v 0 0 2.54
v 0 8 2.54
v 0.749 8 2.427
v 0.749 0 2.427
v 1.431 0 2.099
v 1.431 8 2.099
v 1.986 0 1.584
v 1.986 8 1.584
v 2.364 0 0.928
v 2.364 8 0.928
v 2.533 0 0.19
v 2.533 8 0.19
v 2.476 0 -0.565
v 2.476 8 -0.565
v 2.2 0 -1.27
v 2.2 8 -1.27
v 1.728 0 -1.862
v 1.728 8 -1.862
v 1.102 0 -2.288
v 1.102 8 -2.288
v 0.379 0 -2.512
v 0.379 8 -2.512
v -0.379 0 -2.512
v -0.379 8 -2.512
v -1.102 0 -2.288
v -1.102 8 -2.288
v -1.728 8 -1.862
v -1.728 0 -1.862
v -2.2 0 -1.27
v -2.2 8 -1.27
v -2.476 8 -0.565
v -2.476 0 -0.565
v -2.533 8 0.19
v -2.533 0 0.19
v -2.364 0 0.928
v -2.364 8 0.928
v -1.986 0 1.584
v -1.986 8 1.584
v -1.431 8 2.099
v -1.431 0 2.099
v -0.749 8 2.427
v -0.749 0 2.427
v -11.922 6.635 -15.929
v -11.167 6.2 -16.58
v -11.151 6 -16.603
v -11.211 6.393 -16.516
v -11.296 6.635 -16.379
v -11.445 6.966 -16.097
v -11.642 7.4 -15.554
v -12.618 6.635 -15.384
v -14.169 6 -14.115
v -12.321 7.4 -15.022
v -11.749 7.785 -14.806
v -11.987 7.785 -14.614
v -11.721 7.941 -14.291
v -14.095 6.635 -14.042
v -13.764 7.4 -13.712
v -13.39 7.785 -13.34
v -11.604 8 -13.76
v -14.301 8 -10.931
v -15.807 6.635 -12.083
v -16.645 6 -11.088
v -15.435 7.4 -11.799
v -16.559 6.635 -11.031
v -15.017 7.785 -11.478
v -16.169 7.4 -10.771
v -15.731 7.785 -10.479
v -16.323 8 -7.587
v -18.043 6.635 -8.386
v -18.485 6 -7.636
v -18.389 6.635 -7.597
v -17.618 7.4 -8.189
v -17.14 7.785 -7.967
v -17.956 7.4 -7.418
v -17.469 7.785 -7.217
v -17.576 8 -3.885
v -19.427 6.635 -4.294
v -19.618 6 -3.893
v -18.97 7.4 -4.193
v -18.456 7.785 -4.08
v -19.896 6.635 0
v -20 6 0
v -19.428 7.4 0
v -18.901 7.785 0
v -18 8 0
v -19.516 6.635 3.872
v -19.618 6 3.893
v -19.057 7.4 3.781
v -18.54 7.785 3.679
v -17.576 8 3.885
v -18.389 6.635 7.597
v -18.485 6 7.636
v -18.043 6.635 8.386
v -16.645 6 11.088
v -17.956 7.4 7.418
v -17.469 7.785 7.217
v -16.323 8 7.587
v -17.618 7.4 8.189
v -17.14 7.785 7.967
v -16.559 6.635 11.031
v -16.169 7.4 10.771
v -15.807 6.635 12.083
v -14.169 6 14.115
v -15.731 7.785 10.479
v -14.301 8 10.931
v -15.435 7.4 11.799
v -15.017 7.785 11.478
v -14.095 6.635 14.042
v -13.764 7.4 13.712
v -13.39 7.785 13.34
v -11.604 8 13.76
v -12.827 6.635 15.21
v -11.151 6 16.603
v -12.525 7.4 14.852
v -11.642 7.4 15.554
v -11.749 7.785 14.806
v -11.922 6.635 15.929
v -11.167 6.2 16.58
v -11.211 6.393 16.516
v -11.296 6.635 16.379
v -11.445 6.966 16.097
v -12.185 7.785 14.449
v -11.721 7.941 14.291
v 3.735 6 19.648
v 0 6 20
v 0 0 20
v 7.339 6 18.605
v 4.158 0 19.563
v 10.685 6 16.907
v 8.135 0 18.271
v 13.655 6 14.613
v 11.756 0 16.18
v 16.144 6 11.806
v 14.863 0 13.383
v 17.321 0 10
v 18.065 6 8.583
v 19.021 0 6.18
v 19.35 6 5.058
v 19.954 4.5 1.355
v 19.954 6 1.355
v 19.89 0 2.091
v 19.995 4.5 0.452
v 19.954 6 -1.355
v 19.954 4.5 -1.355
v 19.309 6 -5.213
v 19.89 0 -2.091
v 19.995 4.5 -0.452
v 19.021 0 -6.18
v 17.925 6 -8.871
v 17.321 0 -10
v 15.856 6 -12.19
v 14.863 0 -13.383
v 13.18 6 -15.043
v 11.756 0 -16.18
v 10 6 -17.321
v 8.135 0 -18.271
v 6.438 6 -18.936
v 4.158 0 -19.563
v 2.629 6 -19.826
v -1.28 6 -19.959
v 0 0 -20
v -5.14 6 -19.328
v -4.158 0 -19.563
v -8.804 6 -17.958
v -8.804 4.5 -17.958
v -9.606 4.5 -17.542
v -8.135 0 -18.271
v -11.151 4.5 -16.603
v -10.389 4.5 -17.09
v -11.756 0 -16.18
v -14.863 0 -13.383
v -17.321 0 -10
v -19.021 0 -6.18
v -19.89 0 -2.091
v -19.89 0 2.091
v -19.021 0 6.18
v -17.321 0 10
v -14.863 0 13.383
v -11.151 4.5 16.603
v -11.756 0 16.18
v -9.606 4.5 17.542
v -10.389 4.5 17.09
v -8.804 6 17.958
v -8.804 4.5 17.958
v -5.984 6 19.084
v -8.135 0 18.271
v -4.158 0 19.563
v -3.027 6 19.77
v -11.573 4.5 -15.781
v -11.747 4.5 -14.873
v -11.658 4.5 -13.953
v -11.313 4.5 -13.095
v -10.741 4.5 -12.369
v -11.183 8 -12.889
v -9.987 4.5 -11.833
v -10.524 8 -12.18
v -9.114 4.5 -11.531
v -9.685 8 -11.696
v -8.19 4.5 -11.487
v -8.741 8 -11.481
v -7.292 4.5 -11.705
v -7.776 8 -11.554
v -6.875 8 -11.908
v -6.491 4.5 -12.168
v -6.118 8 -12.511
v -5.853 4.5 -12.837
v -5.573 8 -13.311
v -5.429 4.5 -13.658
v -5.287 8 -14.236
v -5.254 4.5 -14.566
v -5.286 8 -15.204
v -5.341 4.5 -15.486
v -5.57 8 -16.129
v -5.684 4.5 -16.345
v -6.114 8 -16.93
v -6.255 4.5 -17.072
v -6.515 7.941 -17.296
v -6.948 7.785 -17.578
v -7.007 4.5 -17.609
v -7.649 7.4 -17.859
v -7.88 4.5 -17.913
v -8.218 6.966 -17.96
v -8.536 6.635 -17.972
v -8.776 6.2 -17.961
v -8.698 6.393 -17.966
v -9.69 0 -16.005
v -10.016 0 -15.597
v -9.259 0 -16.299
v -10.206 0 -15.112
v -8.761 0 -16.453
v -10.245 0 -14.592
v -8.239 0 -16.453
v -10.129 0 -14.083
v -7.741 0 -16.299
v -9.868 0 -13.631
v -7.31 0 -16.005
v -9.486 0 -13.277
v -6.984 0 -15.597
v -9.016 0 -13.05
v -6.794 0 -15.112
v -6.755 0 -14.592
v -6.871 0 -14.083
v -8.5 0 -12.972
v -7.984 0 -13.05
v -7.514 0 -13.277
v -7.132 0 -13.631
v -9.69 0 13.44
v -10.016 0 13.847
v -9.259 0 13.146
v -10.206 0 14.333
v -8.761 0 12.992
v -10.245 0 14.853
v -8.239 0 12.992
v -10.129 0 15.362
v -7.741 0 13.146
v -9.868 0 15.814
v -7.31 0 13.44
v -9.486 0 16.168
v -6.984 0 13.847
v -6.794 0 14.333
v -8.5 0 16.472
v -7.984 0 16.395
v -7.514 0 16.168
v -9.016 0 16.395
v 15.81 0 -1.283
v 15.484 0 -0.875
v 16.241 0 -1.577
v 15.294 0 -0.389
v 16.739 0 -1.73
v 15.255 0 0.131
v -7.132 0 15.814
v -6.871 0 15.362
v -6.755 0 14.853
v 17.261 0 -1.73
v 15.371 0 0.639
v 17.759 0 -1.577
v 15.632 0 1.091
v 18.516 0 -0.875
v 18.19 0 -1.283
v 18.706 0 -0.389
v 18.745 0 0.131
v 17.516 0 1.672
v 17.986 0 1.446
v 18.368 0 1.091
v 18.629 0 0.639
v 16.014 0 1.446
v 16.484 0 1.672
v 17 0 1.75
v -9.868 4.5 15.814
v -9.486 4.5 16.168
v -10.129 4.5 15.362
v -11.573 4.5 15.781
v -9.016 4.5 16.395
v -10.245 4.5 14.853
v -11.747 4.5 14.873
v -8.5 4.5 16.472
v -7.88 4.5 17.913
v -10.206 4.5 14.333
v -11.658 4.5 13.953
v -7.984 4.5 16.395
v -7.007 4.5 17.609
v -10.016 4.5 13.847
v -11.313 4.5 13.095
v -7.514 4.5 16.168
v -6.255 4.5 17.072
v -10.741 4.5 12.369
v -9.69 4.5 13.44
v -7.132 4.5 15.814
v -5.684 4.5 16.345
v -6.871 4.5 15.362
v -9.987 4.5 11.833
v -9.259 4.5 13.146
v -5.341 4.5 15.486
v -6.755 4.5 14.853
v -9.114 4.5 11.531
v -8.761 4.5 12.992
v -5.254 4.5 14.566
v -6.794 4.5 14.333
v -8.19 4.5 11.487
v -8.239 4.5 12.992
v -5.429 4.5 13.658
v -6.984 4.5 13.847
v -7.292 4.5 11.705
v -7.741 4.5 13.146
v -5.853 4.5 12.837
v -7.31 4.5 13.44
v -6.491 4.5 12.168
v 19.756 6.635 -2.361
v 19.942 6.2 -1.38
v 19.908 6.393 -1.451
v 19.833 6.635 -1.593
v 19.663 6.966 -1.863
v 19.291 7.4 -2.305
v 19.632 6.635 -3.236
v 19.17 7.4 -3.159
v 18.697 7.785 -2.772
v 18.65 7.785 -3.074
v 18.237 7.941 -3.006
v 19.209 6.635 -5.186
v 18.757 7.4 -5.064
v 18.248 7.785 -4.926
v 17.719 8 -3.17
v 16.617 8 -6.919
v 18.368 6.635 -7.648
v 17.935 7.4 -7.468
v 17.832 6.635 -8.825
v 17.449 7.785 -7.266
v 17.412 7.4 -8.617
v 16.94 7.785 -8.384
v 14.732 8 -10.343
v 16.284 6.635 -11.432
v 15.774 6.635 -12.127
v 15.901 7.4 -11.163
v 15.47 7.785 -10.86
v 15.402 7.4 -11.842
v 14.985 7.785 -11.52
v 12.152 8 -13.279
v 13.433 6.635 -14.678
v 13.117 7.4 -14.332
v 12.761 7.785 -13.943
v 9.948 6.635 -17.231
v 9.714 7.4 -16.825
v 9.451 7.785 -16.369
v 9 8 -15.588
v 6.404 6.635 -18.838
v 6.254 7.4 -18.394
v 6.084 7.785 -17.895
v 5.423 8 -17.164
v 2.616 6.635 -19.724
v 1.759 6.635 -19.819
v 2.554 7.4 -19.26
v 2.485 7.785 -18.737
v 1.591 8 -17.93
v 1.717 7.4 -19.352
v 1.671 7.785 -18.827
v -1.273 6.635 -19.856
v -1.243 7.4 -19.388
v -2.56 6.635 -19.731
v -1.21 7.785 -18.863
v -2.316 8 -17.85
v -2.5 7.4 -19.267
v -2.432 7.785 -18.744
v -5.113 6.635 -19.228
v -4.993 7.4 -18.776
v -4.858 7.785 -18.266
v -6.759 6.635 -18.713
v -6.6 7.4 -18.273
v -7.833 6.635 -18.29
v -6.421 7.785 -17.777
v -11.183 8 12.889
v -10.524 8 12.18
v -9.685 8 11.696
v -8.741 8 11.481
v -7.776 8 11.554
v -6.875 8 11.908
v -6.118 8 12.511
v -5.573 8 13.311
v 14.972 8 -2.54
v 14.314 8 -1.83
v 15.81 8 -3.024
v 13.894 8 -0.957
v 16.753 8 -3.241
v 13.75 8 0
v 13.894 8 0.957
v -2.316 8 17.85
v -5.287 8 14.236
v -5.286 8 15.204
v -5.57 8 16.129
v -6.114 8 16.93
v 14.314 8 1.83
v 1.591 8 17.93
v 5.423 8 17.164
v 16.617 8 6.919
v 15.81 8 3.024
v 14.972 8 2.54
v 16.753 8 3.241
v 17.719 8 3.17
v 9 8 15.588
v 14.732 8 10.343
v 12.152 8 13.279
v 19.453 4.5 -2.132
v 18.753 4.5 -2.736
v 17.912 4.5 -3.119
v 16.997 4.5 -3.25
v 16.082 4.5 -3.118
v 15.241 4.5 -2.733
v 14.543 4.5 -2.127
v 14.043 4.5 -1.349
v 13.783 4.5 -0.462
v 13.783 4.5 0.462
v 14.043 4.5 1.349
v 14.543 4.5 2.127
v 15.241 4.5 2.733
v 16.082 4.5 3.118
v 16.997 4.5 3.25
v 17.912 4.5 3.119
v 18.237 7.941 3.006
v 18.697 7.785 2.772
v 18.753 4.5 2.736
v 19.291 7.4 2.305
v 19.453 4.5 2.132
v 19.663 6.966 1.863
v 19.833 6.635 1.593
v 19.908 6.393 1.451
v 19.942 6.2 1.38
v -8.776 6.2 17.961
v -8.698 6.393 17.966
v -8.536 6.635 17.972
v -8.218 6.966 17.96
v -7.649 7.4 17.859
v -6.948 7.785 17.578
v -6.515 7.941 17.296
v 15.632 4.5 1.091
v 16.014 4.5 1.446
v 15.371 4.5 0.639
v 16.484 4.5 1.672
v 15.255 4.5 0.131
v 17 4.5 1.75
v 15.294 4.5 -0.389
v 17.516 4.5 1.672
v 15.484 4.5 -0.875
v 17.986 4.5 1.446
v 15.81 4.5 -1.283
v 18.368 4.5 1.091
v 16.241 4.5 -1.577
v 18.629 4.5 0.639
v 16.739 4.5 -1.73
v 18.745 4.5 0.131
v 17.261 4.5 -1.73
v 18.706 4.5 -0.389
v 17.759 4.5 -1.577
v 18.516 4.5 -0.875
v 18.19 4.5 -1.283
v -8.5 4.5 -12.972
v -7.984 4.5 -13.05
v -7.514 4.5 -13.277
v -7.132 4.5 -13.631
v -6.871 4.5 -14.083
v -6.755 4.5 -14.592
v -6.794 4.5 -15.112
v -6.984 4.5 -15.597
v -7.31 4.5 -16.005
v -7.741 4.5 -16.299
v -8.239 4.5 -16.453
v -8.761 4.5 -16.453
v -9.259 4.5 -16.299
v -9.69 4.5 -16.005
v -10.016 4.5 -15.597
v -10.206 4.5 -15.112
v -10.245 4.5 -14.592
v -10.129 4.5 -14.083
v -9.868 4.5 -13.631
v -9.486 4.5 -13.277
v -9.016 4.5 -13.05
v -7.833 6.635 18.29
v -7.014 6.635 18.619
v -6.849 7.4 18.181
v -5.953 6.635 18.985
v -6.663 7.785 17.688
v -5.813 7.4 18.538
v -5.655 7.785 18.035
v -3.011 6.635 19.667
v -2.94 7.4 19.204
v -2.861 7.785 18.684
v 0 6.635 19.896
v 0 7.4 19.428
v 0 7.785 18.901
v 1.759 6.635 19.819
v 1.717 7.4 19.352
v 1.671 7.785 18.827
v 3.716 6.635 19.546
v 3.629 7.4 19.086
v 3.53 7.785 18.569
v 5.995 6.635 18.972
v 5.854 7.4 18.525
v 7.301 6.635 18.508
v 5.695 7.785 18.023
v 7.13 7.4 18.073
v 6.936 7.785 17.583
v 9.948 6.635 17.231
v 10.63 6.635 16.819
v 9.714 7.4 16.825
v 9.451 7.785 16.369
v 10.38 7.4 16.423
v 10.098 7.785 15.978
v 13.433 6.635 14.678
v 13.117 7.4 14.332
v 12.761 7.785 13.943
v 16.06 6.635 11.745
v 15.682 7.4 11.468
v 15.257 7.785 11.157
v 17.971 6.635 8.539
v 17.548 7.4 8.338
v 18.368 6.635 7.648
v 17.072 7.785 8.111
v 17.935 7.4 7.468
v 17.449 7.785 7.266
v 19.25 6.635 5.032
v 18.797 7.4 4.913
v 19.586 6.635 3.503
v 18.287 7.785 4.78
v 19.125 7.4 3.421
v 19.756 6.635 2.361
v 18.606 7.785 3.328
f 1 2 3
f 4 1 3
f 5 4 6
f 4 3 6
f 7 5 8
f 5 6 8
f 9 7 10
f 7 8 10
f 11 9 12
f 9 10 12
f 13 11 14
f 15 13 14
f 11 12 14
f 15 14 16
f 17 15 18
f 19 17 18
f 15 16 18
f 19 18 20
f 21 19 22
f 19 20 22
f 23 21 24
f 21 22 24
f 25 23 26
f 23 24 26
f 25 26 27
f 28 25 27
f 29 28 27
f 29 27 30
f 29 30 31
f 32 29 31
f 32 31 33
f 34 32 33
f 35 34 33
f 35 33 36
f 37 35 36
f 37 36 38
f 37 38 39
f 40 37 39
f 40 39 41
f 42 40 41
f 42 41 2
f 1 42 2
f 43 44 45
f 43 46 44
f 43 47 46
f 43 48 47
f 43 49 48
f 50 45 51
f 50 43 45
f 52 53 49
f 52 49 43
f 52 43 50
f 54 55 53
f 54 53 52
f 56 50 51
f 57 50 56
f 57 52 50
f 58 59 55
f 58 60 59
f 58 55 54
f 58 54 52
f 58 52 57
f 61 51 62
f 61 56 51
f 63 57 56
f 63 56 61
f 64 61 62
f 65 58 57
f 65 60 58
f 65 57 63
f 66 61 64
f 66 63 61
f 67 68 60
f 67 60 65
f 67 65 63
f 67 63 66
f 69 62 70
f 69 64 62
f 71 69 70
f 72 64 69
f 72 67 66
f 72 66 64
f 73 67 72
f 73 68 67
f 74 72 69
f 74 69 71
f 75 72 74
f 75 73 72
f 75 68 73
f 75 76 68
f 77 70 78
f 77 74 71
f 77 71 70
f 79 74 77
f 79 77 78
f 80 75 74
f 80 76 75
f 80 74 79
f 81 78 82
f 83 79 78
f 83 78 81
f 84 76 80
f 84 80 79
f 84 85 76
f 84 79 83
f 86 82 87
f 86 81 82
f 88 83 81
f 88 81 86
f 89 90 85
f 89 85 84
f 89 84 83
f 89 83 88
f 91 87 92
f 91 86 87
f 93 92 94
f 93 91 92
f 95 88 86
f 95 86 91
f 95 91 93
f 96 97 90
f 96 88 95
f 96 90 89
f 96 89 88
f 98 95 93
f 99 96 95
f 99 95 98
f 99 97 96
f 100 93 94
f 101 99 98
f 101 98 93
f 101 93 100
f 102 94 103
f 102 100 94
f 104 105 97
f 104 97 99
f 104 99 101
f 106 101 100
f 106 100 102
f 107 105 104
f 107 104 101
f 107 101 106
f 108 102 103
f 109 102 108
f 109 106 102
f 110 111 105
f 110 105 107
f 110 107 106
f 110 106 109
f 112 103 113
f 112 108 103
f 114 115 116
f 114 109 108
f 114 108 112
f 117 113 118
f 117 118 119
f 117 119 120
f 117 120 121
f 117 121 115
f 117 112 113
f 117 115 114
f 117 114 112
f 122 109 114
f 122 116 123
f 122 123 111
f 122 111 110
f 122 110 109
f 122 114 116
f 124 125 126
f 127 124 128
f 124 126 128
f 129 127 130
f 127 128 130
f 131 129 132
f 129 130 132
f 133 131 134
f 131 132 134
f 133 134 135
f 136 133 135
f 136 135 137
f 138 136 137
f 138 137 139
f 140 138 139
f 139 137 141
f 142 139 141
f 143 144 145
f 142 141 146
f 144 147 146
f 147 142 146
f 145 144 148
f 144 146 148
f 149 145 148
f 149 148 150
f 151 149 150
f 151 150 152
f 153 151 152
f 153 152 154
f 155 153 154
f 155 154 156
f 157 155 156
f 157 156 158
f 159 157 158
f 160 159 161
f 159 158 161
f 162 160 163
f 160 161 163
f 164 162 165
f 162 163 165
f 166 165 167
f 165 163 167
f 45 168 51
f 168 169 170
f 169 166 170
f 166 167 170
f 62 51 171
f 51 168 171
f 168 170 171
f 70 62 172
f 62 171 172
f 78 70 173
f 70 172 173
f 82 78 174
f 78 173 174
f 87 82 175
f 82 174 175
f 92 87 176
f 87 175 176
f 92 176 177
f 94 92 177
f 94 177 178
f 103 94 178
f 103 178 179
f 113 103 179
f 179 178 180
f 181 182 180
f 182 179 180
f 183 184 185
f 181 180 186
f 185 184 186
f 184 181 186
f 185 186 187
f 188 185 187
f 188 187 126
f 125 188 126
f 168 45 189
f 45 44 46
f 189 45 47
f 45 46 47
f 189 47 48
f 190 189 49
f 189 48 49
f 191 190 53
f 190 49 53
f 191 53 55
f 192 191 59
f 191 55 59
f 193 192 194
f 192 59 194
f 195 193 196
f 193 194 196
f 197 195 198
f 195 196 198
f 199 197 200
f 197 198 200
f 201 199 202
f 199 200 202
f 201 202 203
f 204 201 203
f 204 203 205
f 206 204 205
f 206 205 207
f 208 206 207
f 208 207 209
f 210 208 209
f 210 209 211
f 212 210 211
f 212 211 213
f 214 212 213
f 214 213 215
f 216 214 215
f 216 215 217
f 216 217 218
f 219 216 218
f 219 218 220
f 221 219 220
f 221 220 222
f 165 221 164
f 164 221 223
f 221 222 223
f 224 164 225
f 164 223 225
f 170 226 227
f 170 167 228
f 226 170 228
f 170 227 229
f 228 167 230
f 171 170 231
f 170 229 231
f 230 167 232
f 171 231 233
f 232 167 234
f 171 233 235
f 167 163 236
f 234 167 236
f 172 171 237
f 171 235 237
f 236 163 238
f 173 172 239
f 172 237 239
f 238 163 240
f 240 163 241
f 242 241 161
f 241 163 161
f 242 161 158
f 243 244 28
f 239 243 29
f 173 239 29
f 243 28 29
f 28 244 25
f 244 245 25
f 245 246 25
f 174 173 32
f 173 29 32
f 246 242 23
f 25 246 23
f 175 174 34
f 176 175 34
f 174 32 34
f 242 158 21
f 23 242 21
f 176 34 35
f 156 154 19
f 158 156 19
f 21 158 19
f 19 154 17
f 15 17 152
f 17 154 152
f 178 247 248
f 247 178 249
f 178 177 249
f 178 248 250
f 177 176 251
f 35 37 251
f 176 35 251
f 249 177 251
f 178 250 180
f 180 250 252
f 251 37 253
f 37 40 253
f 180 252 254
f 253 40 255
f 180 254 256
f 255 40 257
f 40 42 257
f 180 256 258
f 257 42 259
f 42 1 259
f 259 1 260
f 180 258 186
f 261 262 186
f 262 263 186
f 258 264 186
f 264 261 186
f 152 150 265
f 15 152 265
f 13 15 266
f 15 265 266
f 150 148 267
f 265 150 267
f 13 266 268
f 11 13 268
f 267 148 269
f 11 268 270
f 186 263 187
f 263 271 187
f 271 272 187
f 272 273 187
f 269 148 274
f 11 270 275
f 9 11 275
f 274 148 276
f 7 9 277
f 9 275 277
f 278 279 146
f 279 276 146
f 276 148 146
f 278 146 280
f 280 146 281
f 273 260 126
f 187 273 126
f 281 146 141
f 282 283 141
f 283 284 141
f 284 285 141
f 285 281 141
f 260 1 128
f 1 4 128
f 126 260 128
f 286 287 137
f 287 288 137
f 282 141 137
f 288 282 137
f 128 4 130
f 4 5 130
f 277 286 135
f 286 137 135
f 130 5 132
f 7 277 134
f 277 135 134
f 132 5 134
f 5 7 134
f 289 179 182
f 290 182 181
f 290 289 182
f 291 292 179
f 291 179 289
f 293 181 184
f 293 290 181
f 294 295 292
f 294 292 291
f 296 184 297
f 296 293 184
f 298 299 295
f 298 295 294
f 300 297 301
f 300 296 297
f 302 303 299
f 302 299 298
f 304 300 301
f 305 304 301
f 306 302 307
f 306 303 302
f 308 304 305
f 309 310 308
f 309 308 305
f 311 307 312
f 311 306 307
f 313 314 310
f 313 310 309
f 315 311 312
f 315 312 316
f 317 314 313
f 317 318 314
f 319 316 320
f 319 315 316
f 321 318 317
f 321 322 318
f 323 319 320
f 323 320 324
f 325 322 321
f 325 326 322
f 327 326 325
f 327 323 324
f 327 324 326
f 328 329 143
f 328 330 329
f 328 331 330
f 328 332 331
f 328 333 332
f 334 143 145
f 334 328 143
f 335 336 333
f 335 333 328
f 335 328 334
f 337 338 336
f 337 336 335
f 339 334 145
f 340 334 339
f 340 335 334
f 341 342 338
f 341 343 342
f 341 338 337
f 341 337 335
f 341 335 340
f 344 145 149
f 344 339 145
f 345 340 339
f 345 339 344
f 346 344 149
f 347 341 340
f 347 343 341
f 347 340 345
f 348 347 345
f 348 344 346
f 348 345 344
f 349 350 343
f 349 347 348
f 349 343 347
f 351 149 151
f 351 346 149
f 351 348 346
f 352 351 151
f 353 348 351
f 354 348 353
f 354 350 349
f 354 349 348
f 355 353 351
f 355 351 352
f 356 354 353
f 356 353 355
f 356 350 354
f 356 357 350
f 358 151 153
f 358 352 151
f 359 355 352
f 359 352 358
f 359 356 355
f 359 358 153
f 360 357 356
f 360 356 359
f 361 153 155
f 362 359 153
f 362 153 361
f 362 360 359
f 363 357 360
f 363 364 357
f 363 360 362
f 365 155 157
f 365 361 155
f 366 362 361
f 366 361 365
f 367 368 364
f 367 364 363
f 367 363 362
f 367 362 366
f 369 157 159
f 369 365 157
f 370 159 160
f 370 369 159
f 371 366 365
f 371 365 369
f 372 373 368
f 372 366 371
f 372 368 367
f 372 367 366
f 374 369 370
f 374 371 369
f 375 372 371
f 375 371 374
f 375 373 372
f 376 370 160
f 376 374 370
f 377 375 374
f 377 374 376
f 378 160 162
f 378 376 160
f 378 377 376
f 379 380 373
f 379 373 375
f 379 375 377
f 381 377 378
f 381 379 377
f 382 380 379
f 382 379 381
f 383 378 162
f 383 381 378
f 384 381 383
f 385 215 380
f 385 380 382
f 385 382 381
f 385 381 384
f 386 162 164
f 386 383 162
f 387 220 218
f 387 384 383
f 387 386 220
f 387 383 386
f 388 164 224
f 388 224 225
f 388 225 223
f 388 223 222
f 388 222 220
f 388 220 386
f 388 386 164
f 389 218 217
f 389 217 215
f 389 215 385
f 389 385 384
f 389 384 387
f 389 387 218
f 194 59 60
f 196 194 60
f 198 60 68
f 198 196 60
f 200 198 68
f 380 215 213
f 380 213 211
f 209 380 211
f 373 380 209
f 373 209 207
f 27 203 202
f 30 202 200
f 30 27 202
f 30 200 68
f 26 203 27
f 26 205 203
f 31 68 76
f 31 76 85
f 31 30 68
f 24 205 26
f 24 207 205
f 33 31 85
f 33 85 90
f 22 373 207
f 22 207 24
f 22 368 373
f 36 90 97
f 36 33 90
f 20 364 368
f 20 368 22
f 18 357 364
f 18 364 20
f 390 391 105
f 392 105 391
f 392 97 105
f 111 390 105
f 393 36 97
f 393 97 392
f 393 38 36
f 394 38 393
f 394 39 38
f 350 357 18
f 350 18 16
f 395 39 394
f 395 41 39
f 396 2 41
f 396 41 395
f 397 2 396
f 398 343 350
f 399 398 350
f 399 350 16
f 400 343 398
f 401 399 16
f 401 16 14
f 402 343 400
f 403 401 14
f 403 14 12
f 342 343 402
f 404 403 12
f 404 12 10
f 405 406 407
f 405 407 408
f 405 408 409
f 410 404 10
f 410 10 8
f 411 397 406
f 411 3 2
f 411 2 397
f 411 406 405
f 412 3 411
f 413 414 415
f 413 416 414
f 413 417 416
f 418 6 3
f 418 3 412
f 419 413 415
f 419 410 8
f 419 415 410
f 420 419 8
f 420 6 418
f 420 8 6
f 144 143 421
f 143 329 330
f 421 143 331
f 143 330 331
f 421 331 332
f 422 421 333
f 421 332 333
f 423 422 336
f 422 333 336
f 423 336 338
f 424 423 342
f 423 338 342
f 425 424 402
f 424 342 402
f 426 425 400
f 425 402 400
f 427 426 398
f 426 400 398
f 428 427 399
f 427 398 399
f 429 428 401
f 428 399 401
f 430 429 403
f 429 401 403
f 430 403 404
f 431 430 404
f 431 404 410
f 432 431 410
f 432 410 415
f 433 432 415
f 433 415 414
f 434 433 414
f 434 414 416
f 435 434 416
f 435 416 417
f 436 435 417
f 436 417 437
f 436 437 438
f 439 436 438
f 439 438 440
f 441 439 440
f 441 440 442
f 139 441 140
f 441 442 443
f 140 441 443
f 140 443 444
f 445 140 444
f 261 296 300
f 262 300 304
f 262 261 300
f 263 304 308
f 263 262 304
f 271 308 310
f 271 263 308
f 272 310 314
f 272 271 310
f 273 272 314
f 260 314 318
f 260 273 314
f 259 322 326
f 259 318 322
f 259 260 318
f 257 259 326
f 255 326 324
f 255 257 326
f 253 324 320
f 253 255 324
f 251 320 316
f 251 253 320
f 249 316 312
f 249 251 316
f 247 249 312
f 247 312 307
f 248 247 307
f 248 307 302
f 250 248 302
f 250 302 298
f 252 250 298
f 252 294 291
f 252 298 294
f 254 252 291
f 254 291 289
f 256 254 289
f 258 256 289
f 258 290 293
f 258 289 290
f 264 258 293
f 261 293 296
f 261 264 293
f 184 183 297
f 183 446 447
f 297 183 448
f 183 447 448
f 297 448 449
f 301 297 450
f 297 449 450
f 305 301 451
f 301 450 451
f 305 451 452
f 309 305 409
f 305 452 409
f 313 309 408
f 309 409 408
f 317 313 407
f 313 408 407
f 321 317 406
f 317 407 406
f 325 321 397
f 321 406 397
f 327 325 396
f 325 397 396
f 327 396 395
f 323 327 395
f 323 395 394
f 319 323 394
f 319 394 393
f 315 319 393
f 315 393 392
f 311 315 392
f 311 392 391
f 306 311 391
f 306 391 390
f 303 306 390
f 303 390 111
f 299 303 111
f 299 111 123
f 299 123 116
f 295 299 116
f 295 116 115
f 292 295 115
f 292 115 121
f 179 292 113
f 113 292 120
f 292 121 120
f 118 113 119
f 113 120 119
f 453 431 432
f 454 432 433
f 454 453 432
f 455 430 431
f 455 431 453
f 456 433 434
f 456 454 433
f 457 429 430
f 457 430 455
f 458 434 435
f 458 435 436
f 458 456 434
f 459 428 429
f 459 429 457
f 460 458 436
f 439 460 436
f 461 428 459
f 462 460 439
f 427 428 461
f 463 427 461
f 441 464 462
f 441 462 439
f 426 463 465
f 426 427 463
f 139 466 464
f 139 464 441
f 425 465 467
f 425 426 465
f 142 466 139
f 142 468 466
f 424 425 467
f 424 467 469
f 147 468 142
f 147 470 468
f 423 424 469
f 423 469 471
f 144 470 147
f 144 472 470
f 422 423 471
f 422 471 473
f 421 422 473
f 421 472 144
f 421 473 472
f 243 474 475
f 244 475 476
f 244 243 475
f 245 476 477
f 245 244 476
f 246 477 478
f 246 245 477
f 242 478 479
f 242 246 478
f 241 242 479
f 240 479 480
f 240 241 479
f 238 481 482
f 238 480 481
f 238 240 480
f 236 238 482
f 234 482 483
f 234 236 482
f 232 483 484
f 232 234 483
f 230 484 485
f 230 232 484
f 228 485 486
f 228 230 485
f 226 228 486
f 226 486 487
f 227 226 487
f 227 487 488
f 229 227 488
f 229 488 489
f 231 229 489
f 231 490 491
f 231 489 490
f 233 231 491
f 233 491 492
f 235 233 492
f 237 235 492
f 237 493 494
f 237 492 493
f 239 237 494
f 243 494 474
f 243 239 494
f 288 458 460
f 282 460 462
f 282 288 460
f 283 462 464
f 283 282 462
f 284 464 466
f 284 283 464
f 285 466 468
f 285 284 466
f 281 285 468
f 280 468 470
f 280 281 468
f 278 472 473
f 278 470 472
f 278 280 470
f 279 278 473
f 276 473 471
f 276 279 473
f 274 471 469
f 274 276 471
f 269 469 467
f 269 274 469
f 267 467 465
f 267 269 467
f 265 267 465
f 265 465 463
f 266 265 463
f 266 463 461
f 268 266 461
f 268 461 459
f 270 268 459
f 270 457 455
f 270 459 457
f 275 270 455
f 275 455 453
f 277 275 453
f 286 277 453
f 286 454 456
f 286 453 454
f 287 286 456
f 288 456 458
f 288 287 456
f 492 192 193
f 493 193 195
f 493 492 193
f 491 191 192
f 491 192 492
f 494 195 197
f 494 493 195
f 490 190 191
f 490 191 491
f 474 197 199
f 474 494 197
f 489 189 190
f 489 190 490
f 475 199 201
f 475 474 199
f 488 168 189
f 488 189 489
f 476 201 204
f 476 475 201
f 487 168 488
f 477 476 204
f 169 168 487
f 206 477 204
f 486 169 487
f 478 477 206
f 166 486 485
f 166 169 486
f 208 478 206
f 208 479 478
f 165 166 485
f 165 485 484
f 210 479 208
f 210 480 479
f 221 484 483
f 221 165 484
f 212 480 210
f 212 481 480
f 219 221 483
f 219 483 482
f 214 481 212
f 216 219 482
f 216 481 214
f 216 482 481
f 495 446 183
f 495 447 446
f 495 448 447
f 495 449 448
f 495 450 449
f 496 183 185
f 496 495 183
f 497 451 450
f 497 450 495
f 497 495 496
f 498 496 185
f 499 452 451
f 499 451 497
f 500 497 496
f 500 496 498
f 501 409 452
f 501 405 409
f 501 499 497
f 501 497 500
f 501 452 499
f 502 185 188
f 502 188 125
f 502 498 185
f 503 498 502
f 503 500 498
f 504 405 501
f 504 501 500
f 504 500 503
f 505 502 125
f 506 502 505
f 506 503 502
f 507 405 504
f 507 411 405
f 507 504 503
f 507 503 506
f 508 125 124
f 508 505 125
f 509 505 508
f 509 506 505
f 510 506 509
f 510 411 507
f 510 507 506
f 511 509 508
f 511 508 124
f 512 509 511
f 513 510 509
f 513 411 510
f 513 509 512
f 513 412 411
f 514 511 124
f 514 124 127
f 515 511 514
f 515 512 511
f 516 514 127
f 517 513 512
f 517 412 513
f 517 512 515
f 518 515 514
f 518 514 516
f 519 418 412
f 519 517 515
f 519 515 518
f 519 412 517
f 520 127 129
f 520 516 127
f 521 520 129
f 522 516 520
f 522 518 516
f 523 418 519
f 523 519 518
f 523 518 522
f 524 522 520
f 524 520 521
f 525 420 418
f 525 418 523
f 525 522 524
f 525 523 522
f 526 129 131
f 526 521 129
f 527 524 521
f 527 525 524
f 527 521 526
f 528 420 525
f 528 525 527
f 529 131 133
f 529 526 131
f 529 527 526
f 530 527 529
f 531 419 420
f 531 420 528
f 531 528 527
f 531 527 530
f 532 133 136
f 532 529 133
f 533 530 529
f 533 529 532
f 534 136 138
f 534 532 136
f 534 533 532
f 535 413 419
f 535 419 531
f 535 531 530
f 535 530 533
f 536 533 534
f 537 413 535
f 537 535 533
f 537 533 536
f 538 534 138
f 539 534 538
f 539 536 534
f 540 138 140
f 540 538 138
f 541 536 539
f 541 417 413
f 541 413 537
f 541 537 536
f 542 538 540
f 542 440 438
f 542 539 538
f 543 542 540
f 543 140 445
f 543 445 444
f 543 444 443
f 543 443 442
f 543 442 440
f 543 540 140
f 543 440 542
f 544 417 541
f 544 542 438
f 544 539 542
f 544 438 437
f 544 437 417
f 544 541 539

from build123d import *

# Parameters (mm, degrees)
SKETCH1_R           = 20
SKETCH1_R_2         = 1.75
BOSS_EXTRUDE1_DEPTH = 8
SKETCH2_R           = 3.25
CUT_EXTRUDE1_DEPTH  = 3.5
SKETCH3_R           = 2.54000508
CUT_EXTRUDE2_DEPTH  = 30.393876913
FILLET1_R           = 2


with BuildPart() as part:
    # Sketch1 → Boss-Extrude1 (new body)
    with BuildSketch(Plane(origin=(0, 0, 0), x_dir=(1, 0, 0), z_dir=(0, 1, 0))):
        with Locations(Location((0, 0, 0), (0, 0, 270))):
            Circle(SKETCH1_R)
        with Locations(Location((17, 0, 0), (0, 0, 270))):
            Circle(SKETCH1_R_2, mode=Mode.SUBTRACT)
        with Locations(Location((-8.5, -14.722431864, 0), (0, 0, 270))):
            Circle(SKETCH1_R_2, mode=Mode.SUBTRACT)
        with Locations(Location((-8.5, 14.722431864, 0), (0, 0, 270))):
            Circle(SKETCH1_R_2, mode=Mode.SUBTRACT)
    extrude(amount=BOSS_EXTRUDE1_DEPTH)

    # Sketch2 → Cut-Extrude1 (cut)
    with BuildSketch(Plane(origin=(0, 8, 0), x_dir=(1, 0, 0), z_dir=(0, 1, 0))):
        with Locations((17, 0)):
            Circle(SKETCH2_R)
        with Locations((-8.5, -14.722431864)):
            Circle(SKETCH2_R)
        with Locations((-8.5, 14.722431864)):
            Circle(SKETCH2_R)
    extrude(amount=-CUT_EXTRUDE1_DEPTH, mode=Mode.SUBTRACT)

    # Sketch3 → Cut-Extrude2 (cut, through all)
    with BuildSketch(Plane(origin=(0, 8, 0), x_dir=(1, 0, 0), z_dir=(0, 1, 0))):
        with Locations(Location((0, 0, 0), (0, 0, 270))):
            Circle(SKETCH3_R)
    extrude(amount=-CUT_EXTRUDE2_DEPTH, mode=Mode.SUBTRACT)

    # Fillet1
    fillet1_edges = [part.edges().sort_by_distance(p)[0] for p in [
        (10, 8, -17.320508076),
        (-20, 8, 0),
        (13.654656242, 8, 14.613362478),
    ]]
    fillet(fillet1_edges, radius=FILLET1_R)


solid = part.part
